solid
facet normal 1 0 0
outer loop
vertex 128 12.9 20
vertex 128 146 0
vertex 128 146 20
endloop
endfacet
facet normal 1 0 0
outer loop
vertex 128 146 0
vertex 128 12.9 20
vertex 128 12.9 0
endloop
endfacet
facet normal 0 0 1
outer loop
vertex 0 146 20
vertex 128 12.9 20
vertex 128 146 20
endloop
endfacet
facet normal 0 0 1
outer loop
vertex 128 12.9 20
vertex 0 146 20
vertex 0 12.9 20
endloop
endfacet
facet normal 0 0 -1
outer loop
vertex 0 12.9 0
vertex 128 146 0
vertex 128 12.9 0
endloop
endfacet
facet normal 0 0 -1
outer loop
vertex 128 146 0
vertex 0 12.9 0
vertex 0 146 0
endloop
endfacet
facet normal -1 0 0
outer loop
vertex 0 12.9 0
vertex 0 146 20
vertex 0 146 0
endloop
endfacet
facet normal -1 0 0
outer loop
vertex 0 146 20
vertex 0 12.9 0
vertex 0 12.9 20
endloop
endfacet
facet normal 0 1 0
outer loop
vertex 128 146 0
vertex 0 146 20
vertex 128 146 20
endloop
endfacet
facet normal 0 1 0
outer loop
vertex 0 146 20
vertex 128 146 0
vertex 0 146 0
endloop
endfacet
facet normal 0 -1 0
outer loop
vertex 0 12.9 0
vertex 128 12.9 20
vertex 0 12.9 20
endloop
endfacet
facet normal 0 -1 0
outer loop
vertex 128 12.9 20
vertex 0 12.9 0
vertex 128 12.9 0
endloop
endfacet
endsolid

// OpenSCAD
// Noctua NH-L12S Heatsink Fins
// Aluminum fin stack at top of cooler

module nh_l12s_fins() {
    fins_w = 128;
    fins_d = 146;
    fins_h = 20;

    // RAM cutout dimensions
    ram_cutout_w = 134;
    ram_cutout_d = 13;
    ram_cutout_h = fins_h + 1;

    color("silver") {
        difference() {
            cube([fins_w, fins_d, fins_h]);
            // RAM Cutout (front edge, full height of fins)
            translate([(fins_w - ram_cutout_w)/2, -0.1, -0.1]) {
                cube([ram_cutout_w, ram_cutout_d, ram_cutout_h]);
            }
        }
    }
}

// Preview
nh_l12s_fins();
